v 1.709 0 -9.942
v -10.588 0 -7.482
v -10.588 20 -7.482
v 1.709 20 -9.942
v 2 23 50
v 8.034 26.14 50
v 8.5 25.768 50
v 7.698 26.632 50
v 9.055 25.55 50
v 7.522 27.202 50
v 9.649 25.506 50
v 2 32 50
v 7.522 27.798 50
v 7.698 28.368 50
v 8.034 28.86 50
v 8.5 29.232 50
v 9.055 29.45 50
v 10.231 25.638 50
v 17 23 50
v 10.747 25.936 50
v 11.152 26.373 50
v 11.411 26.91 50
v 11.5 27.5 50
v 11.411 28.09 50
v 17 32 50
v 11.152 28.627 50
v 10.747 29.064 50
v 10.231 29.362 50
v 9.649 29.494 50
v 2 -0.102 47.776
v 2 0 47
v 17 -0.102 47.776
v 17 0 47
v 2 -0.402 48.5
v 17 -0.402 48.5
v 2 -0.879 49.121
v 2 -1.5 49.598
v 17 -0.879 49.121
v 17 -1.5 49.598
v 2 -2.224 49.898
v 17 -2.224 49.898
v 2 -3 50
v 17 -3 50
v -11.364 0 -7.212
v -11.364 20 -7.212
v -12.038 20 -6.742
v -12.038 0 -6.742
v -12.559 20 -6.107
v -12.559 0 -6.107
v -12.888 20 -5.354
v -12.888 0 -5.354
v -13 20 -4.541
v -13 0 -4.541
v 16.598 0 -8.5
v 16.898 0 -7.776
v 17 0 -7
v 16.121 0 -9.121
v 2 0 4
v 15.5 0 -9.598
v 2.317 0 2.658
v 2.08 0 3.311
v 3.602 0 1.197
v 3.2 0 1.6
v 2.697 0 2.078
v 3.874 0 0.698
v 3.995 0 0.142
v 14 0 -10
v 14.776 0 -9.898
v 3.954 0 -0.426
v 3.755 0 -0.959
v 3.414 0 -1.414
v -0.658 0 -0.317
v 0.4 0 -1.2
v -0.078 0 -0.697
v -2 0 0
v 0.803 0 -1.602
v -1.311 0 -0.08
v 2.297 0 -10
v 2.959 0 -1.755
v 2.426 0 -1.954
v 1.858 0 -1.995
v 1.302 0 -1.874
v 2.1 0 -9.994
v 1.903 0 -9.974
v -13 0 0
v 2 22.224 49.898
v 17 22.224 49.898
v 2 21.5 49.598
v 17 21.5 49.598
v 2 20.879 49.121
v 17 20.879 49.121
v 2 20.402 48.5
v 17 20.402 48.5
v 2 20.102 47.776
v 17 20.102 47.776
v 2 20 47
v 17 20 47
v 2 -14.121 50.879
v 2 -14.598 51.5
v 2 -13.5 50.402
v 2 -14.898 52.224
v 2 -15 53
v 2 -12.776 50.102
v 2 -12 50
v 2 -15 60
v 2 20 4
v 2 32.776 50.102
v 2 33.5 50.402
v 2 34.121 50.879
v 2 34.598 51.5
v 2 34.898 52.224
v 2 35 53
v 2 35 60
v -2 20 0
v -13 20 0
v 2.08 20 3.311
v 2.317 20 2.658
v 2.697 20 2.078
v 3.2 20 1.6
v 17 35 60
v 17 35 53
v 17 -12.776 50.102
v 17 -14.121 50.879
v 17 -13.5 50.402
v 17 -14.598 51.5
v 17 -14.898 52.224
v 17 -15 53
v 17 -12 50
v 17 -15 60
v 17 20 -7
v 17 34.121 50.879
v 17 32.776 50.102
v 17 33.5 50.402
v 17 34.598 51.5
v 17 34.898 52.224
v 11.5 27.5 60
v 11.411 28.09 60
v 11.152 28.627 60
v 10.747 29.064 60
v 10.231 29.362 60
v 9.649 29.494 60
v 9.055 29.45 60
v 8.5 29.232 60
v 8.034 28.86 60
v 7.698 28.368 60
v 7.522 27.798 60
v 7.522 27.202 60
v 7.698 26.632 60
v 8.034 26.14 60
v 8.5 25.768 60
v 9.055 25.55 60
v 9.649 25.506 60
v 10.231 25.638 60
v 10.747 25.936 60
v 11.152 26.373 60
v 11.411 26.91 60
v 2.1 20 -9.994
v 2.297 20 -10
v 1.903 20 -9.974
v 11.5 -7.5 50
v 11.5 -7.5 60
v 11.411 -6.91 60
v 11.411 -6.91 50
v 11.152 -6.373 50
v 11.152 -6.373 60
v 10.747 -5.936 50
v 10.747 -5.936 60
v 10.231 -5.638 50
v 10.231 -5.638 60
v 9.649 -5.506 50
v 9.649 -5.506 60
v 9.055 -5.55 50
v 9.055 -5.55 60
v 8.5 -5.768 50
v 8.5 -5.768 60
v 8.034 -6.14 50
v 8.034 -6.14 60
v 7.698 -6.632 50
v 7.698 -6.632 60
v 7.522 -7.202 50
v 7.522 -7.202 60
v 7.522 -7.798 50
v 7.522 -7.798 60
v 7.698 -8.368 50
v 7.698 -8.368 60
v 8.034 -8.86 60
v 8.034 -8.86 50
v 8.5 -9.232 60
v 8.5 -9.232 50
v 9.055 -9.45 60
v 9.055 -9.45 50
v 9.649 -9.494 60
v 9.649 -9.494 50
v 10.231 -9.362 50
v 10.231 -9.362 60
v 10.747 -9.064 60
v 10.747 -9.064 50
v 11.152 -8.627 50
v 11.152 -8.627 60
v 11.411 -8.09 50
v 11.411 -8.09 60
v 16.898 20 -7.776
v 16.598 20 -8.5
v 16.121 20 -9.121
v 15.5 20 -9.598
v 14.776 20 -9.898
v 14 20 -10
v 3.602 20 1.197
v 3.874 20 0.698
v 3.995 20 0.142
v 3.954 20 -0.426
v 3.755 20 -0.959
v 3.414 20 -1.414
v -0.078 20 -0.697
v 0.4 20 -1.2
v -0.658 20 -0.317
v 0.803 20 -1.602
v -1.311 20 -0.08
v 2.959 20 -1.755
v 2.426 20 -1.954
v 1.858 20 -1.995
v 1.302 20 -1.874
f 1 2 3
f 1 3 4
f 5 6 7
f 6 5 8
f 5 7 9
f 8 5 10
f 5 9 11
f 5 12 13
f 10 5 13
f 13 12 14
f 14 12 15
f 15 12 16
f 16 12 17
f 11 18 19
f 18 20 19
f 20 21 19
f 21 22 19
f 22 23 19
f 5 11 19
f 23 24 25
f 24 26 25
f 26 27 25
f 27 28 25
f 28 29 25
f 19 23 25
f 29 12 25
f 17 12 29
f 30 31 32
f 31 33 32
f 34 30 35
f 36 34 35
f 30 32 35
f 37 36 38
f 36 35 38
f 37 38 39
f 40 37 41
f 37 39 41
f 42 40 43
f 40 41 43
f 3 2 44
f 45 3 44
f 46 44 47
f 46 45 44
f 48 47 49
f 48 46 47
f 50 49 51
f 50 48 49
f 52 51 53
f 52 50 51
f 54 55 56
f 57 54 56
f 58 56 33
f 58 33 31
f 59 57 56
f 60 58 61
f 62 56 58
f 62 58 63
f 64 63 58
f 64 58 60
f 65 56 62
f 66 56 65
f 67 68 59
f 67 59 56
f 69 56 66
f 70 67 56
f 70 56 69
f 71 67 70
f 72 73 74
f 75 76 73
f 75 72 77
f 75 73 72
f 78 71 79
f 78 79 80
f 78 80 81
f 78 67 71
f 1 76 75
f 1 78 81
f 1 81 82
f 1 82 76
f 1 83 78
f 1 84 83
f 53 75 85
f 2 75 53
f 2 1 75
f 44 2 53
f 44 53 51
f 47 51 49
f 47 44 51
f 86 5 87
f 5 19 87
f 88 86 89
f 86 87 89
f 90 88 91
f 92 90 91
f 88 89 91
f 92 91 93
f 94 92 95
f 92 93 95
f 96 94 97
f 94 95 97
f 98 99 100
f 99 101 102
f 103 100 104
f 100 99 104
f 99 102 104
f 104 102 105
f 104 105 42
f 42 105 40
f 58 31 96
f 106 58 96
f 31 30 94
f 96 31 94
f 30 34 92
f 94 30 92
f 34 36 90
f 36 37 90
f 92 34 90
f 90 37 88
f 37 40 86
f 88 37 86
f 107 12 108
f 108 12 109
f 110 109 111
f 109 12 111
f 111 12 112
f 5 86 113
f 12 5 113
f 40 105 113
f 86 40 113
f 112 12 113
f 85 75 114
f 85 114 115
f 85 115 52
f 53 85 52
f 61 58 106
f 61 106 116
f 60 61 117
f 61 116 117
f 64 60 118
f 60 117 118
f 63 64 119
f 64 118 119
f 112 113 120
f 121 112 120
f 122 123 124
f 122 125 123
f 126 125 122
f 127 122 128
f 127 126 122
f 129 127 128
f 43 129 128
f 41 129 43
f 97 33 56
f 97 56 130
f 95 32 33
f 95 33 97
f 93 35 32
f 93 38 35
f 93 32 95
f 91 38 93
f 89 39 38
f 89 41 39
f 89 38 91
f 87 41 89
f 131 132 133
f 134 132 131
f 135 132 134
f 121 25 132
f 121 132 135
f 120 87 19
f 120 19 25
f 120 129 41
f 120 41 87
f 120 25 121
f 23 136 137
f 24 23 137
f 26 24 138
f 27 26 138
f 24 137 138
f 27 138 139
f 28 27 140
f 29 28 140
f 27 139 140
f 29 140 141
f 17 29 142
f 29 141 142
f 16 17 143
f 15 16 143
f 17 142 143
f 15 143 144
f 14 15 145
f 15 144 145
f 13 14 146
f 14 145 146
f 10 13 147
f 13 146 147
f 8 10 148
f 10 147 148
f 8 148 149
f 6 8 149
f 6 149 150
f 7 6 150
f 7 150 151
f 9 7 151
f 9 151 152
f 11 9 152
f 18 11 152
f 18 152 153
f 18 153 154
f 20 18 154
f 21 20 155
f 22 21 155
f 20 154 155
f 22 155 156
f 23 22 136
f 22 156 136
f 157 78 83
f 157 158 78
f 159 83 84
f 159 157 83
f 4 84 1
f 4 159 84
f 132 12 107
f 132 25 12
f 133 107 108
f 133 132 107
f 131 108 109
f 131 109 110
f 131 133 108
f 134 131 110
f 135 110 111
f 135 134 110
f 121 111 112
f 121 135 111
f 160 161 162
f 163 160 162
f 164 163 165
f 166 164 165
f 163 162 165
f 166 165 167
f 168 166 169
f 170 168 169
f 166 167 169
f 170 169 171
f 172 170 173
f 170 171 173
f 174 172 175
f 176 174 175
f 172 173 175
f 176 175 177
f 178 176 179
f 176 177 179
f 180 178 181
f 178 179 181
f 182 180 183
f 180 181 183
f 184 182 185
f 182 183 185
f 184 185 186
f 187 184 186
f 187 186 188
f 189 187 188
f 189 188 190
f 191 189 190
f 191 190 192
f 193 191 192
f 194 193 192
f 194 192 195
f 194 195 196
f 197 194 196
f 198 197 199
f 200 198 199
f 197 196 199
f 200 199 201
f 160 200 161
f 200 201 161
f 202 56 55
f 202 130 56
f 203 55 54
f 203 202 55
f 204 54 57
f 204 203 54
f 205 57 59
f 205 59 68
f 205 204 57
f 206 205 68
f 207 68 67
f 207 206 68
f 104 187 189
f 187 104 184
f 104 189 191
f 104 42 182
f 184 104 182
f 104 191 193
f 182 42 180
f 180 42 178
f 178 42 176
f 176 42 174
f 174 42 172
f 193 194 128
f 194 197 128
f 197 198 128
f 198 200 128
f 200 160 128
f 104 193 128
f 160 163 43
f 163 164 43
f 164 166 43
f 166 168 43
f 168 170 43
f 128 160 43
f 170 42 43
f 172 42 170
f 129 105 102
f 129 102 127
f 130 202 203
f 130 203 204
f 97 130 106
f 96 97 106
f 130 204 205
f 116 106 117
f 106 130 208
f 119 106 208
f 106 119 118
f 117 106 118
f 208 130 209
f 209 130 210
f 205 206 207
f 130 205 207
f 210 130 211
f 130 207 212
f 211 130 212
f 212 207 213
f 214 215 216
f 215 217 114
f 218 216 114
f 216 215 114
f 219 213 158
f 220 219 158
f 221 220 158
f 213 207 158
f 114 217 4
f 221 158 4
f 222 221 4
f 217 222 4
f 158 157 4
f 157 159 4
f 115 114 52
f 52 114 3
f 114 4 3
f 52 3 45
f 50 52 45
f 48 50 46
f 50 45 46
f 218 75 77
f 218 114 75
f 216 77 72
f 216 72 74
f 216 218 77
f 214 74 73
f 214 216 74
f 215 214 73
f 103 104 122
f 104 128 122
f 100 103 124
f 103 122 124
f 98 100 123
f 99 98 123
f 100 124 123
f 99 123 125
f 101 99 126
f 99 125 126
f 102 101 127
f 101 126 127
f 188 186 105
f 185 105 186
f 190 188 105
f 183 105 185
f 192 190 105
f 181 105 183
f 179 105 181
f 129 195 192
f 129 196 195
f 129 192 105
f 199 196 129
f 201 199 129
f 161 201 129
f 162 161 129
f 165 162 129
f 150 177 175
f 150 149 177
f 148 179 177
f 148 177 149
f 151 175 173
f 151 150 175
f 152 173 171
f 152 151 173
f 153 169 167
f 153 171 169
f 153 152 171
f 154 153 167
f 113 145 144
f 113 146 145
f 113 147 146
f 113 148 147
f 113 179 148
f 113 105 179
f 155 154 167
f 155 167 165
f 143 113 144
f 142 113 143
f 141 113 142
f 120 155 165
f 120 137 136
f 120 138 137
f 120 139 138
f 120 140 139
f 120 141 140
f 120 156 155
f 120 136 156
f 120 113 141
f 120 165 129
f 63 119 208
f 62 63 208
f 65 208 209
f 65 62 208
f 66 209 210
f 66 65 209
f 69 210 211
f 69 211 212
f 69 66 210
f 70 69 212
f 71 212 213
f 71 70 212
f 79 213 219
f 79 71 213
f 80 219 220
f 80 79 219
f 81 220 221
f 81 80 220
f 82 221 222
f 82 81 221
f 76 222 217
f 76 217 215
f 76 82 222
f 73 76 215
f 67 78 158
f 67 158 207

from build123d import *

# Parameters (mm, degrees)
BOSS_EXTRUDE1_DEPTH = 20
SKETCH2_W           = 15
SKETCH2_H           = 15
SKETCH2_R           = 2
BOSS_EXTRUDE2_DEPTH = 10
FILLET1_R           = 3


with BuildPart() as part:
    # Sketch1 → Boss-Extrude1 (new body)
    with BuildSketch(Plane(origin=(0, 0, 0), x_dir=(1, 0, 0), z_dir=(0, 1, 0))):
        with BuildLine():
            Line((0, 0), (-13, 0))
            Line((-13, 0), (-13, 7))
            Line((-13, 7), (2, 10))
            Line((2, 10), (17, 10))
            Line((17, 10), (17, -60))
            Line((17, -60), (2, -60))
            Line((2, -60), (2, -2))
            ThreePointArc((2, -2), (3.414213562, 1.414213562), (0, 0))
        make_face()
    extrude(amount=BOSS_EXTRUDE1_DEPTH)

    # Sketch2 → Boss-Extrude2 (add)
    with BuildSketch(Plane.XY.offset(60)):
        with Locations((9.5, 27.5)):
            Rectangle(SKETCH2_W, SKETCH2_H)
        with Locations((9.5, 27.5)):
            Circle(SKETCH2_R, mode=Mode.SUBTRACT)
        with Locations((9.5, -7.5)):
            Rectangle(SKETCH2_W, SKETCH2_H)
        with Locations((9.5, -7.5)):
            Circle(SKETCH2_R, mode=Mode.SUBTRACT)
    extrude(amount=-BOSS_EXTRUDE2_DEPTH)

    # Fillet1
    fillet1_edges = [part.edges().sort_by_distance(p)[0] for p in [
        (0, 10, 0),
        (-13, 10, -7),
        (2, 10, -10),
        (17, 10, -10),
        (2, 10, 2),
        (9.5, 35, 50),
        (9.5, 20, 50),
        (9.5, 0, 50),
        (9.5, -15, 50),
    ]]
    fillet(fillet1_edges, radius=FILLET1_R)


solid = part.part
